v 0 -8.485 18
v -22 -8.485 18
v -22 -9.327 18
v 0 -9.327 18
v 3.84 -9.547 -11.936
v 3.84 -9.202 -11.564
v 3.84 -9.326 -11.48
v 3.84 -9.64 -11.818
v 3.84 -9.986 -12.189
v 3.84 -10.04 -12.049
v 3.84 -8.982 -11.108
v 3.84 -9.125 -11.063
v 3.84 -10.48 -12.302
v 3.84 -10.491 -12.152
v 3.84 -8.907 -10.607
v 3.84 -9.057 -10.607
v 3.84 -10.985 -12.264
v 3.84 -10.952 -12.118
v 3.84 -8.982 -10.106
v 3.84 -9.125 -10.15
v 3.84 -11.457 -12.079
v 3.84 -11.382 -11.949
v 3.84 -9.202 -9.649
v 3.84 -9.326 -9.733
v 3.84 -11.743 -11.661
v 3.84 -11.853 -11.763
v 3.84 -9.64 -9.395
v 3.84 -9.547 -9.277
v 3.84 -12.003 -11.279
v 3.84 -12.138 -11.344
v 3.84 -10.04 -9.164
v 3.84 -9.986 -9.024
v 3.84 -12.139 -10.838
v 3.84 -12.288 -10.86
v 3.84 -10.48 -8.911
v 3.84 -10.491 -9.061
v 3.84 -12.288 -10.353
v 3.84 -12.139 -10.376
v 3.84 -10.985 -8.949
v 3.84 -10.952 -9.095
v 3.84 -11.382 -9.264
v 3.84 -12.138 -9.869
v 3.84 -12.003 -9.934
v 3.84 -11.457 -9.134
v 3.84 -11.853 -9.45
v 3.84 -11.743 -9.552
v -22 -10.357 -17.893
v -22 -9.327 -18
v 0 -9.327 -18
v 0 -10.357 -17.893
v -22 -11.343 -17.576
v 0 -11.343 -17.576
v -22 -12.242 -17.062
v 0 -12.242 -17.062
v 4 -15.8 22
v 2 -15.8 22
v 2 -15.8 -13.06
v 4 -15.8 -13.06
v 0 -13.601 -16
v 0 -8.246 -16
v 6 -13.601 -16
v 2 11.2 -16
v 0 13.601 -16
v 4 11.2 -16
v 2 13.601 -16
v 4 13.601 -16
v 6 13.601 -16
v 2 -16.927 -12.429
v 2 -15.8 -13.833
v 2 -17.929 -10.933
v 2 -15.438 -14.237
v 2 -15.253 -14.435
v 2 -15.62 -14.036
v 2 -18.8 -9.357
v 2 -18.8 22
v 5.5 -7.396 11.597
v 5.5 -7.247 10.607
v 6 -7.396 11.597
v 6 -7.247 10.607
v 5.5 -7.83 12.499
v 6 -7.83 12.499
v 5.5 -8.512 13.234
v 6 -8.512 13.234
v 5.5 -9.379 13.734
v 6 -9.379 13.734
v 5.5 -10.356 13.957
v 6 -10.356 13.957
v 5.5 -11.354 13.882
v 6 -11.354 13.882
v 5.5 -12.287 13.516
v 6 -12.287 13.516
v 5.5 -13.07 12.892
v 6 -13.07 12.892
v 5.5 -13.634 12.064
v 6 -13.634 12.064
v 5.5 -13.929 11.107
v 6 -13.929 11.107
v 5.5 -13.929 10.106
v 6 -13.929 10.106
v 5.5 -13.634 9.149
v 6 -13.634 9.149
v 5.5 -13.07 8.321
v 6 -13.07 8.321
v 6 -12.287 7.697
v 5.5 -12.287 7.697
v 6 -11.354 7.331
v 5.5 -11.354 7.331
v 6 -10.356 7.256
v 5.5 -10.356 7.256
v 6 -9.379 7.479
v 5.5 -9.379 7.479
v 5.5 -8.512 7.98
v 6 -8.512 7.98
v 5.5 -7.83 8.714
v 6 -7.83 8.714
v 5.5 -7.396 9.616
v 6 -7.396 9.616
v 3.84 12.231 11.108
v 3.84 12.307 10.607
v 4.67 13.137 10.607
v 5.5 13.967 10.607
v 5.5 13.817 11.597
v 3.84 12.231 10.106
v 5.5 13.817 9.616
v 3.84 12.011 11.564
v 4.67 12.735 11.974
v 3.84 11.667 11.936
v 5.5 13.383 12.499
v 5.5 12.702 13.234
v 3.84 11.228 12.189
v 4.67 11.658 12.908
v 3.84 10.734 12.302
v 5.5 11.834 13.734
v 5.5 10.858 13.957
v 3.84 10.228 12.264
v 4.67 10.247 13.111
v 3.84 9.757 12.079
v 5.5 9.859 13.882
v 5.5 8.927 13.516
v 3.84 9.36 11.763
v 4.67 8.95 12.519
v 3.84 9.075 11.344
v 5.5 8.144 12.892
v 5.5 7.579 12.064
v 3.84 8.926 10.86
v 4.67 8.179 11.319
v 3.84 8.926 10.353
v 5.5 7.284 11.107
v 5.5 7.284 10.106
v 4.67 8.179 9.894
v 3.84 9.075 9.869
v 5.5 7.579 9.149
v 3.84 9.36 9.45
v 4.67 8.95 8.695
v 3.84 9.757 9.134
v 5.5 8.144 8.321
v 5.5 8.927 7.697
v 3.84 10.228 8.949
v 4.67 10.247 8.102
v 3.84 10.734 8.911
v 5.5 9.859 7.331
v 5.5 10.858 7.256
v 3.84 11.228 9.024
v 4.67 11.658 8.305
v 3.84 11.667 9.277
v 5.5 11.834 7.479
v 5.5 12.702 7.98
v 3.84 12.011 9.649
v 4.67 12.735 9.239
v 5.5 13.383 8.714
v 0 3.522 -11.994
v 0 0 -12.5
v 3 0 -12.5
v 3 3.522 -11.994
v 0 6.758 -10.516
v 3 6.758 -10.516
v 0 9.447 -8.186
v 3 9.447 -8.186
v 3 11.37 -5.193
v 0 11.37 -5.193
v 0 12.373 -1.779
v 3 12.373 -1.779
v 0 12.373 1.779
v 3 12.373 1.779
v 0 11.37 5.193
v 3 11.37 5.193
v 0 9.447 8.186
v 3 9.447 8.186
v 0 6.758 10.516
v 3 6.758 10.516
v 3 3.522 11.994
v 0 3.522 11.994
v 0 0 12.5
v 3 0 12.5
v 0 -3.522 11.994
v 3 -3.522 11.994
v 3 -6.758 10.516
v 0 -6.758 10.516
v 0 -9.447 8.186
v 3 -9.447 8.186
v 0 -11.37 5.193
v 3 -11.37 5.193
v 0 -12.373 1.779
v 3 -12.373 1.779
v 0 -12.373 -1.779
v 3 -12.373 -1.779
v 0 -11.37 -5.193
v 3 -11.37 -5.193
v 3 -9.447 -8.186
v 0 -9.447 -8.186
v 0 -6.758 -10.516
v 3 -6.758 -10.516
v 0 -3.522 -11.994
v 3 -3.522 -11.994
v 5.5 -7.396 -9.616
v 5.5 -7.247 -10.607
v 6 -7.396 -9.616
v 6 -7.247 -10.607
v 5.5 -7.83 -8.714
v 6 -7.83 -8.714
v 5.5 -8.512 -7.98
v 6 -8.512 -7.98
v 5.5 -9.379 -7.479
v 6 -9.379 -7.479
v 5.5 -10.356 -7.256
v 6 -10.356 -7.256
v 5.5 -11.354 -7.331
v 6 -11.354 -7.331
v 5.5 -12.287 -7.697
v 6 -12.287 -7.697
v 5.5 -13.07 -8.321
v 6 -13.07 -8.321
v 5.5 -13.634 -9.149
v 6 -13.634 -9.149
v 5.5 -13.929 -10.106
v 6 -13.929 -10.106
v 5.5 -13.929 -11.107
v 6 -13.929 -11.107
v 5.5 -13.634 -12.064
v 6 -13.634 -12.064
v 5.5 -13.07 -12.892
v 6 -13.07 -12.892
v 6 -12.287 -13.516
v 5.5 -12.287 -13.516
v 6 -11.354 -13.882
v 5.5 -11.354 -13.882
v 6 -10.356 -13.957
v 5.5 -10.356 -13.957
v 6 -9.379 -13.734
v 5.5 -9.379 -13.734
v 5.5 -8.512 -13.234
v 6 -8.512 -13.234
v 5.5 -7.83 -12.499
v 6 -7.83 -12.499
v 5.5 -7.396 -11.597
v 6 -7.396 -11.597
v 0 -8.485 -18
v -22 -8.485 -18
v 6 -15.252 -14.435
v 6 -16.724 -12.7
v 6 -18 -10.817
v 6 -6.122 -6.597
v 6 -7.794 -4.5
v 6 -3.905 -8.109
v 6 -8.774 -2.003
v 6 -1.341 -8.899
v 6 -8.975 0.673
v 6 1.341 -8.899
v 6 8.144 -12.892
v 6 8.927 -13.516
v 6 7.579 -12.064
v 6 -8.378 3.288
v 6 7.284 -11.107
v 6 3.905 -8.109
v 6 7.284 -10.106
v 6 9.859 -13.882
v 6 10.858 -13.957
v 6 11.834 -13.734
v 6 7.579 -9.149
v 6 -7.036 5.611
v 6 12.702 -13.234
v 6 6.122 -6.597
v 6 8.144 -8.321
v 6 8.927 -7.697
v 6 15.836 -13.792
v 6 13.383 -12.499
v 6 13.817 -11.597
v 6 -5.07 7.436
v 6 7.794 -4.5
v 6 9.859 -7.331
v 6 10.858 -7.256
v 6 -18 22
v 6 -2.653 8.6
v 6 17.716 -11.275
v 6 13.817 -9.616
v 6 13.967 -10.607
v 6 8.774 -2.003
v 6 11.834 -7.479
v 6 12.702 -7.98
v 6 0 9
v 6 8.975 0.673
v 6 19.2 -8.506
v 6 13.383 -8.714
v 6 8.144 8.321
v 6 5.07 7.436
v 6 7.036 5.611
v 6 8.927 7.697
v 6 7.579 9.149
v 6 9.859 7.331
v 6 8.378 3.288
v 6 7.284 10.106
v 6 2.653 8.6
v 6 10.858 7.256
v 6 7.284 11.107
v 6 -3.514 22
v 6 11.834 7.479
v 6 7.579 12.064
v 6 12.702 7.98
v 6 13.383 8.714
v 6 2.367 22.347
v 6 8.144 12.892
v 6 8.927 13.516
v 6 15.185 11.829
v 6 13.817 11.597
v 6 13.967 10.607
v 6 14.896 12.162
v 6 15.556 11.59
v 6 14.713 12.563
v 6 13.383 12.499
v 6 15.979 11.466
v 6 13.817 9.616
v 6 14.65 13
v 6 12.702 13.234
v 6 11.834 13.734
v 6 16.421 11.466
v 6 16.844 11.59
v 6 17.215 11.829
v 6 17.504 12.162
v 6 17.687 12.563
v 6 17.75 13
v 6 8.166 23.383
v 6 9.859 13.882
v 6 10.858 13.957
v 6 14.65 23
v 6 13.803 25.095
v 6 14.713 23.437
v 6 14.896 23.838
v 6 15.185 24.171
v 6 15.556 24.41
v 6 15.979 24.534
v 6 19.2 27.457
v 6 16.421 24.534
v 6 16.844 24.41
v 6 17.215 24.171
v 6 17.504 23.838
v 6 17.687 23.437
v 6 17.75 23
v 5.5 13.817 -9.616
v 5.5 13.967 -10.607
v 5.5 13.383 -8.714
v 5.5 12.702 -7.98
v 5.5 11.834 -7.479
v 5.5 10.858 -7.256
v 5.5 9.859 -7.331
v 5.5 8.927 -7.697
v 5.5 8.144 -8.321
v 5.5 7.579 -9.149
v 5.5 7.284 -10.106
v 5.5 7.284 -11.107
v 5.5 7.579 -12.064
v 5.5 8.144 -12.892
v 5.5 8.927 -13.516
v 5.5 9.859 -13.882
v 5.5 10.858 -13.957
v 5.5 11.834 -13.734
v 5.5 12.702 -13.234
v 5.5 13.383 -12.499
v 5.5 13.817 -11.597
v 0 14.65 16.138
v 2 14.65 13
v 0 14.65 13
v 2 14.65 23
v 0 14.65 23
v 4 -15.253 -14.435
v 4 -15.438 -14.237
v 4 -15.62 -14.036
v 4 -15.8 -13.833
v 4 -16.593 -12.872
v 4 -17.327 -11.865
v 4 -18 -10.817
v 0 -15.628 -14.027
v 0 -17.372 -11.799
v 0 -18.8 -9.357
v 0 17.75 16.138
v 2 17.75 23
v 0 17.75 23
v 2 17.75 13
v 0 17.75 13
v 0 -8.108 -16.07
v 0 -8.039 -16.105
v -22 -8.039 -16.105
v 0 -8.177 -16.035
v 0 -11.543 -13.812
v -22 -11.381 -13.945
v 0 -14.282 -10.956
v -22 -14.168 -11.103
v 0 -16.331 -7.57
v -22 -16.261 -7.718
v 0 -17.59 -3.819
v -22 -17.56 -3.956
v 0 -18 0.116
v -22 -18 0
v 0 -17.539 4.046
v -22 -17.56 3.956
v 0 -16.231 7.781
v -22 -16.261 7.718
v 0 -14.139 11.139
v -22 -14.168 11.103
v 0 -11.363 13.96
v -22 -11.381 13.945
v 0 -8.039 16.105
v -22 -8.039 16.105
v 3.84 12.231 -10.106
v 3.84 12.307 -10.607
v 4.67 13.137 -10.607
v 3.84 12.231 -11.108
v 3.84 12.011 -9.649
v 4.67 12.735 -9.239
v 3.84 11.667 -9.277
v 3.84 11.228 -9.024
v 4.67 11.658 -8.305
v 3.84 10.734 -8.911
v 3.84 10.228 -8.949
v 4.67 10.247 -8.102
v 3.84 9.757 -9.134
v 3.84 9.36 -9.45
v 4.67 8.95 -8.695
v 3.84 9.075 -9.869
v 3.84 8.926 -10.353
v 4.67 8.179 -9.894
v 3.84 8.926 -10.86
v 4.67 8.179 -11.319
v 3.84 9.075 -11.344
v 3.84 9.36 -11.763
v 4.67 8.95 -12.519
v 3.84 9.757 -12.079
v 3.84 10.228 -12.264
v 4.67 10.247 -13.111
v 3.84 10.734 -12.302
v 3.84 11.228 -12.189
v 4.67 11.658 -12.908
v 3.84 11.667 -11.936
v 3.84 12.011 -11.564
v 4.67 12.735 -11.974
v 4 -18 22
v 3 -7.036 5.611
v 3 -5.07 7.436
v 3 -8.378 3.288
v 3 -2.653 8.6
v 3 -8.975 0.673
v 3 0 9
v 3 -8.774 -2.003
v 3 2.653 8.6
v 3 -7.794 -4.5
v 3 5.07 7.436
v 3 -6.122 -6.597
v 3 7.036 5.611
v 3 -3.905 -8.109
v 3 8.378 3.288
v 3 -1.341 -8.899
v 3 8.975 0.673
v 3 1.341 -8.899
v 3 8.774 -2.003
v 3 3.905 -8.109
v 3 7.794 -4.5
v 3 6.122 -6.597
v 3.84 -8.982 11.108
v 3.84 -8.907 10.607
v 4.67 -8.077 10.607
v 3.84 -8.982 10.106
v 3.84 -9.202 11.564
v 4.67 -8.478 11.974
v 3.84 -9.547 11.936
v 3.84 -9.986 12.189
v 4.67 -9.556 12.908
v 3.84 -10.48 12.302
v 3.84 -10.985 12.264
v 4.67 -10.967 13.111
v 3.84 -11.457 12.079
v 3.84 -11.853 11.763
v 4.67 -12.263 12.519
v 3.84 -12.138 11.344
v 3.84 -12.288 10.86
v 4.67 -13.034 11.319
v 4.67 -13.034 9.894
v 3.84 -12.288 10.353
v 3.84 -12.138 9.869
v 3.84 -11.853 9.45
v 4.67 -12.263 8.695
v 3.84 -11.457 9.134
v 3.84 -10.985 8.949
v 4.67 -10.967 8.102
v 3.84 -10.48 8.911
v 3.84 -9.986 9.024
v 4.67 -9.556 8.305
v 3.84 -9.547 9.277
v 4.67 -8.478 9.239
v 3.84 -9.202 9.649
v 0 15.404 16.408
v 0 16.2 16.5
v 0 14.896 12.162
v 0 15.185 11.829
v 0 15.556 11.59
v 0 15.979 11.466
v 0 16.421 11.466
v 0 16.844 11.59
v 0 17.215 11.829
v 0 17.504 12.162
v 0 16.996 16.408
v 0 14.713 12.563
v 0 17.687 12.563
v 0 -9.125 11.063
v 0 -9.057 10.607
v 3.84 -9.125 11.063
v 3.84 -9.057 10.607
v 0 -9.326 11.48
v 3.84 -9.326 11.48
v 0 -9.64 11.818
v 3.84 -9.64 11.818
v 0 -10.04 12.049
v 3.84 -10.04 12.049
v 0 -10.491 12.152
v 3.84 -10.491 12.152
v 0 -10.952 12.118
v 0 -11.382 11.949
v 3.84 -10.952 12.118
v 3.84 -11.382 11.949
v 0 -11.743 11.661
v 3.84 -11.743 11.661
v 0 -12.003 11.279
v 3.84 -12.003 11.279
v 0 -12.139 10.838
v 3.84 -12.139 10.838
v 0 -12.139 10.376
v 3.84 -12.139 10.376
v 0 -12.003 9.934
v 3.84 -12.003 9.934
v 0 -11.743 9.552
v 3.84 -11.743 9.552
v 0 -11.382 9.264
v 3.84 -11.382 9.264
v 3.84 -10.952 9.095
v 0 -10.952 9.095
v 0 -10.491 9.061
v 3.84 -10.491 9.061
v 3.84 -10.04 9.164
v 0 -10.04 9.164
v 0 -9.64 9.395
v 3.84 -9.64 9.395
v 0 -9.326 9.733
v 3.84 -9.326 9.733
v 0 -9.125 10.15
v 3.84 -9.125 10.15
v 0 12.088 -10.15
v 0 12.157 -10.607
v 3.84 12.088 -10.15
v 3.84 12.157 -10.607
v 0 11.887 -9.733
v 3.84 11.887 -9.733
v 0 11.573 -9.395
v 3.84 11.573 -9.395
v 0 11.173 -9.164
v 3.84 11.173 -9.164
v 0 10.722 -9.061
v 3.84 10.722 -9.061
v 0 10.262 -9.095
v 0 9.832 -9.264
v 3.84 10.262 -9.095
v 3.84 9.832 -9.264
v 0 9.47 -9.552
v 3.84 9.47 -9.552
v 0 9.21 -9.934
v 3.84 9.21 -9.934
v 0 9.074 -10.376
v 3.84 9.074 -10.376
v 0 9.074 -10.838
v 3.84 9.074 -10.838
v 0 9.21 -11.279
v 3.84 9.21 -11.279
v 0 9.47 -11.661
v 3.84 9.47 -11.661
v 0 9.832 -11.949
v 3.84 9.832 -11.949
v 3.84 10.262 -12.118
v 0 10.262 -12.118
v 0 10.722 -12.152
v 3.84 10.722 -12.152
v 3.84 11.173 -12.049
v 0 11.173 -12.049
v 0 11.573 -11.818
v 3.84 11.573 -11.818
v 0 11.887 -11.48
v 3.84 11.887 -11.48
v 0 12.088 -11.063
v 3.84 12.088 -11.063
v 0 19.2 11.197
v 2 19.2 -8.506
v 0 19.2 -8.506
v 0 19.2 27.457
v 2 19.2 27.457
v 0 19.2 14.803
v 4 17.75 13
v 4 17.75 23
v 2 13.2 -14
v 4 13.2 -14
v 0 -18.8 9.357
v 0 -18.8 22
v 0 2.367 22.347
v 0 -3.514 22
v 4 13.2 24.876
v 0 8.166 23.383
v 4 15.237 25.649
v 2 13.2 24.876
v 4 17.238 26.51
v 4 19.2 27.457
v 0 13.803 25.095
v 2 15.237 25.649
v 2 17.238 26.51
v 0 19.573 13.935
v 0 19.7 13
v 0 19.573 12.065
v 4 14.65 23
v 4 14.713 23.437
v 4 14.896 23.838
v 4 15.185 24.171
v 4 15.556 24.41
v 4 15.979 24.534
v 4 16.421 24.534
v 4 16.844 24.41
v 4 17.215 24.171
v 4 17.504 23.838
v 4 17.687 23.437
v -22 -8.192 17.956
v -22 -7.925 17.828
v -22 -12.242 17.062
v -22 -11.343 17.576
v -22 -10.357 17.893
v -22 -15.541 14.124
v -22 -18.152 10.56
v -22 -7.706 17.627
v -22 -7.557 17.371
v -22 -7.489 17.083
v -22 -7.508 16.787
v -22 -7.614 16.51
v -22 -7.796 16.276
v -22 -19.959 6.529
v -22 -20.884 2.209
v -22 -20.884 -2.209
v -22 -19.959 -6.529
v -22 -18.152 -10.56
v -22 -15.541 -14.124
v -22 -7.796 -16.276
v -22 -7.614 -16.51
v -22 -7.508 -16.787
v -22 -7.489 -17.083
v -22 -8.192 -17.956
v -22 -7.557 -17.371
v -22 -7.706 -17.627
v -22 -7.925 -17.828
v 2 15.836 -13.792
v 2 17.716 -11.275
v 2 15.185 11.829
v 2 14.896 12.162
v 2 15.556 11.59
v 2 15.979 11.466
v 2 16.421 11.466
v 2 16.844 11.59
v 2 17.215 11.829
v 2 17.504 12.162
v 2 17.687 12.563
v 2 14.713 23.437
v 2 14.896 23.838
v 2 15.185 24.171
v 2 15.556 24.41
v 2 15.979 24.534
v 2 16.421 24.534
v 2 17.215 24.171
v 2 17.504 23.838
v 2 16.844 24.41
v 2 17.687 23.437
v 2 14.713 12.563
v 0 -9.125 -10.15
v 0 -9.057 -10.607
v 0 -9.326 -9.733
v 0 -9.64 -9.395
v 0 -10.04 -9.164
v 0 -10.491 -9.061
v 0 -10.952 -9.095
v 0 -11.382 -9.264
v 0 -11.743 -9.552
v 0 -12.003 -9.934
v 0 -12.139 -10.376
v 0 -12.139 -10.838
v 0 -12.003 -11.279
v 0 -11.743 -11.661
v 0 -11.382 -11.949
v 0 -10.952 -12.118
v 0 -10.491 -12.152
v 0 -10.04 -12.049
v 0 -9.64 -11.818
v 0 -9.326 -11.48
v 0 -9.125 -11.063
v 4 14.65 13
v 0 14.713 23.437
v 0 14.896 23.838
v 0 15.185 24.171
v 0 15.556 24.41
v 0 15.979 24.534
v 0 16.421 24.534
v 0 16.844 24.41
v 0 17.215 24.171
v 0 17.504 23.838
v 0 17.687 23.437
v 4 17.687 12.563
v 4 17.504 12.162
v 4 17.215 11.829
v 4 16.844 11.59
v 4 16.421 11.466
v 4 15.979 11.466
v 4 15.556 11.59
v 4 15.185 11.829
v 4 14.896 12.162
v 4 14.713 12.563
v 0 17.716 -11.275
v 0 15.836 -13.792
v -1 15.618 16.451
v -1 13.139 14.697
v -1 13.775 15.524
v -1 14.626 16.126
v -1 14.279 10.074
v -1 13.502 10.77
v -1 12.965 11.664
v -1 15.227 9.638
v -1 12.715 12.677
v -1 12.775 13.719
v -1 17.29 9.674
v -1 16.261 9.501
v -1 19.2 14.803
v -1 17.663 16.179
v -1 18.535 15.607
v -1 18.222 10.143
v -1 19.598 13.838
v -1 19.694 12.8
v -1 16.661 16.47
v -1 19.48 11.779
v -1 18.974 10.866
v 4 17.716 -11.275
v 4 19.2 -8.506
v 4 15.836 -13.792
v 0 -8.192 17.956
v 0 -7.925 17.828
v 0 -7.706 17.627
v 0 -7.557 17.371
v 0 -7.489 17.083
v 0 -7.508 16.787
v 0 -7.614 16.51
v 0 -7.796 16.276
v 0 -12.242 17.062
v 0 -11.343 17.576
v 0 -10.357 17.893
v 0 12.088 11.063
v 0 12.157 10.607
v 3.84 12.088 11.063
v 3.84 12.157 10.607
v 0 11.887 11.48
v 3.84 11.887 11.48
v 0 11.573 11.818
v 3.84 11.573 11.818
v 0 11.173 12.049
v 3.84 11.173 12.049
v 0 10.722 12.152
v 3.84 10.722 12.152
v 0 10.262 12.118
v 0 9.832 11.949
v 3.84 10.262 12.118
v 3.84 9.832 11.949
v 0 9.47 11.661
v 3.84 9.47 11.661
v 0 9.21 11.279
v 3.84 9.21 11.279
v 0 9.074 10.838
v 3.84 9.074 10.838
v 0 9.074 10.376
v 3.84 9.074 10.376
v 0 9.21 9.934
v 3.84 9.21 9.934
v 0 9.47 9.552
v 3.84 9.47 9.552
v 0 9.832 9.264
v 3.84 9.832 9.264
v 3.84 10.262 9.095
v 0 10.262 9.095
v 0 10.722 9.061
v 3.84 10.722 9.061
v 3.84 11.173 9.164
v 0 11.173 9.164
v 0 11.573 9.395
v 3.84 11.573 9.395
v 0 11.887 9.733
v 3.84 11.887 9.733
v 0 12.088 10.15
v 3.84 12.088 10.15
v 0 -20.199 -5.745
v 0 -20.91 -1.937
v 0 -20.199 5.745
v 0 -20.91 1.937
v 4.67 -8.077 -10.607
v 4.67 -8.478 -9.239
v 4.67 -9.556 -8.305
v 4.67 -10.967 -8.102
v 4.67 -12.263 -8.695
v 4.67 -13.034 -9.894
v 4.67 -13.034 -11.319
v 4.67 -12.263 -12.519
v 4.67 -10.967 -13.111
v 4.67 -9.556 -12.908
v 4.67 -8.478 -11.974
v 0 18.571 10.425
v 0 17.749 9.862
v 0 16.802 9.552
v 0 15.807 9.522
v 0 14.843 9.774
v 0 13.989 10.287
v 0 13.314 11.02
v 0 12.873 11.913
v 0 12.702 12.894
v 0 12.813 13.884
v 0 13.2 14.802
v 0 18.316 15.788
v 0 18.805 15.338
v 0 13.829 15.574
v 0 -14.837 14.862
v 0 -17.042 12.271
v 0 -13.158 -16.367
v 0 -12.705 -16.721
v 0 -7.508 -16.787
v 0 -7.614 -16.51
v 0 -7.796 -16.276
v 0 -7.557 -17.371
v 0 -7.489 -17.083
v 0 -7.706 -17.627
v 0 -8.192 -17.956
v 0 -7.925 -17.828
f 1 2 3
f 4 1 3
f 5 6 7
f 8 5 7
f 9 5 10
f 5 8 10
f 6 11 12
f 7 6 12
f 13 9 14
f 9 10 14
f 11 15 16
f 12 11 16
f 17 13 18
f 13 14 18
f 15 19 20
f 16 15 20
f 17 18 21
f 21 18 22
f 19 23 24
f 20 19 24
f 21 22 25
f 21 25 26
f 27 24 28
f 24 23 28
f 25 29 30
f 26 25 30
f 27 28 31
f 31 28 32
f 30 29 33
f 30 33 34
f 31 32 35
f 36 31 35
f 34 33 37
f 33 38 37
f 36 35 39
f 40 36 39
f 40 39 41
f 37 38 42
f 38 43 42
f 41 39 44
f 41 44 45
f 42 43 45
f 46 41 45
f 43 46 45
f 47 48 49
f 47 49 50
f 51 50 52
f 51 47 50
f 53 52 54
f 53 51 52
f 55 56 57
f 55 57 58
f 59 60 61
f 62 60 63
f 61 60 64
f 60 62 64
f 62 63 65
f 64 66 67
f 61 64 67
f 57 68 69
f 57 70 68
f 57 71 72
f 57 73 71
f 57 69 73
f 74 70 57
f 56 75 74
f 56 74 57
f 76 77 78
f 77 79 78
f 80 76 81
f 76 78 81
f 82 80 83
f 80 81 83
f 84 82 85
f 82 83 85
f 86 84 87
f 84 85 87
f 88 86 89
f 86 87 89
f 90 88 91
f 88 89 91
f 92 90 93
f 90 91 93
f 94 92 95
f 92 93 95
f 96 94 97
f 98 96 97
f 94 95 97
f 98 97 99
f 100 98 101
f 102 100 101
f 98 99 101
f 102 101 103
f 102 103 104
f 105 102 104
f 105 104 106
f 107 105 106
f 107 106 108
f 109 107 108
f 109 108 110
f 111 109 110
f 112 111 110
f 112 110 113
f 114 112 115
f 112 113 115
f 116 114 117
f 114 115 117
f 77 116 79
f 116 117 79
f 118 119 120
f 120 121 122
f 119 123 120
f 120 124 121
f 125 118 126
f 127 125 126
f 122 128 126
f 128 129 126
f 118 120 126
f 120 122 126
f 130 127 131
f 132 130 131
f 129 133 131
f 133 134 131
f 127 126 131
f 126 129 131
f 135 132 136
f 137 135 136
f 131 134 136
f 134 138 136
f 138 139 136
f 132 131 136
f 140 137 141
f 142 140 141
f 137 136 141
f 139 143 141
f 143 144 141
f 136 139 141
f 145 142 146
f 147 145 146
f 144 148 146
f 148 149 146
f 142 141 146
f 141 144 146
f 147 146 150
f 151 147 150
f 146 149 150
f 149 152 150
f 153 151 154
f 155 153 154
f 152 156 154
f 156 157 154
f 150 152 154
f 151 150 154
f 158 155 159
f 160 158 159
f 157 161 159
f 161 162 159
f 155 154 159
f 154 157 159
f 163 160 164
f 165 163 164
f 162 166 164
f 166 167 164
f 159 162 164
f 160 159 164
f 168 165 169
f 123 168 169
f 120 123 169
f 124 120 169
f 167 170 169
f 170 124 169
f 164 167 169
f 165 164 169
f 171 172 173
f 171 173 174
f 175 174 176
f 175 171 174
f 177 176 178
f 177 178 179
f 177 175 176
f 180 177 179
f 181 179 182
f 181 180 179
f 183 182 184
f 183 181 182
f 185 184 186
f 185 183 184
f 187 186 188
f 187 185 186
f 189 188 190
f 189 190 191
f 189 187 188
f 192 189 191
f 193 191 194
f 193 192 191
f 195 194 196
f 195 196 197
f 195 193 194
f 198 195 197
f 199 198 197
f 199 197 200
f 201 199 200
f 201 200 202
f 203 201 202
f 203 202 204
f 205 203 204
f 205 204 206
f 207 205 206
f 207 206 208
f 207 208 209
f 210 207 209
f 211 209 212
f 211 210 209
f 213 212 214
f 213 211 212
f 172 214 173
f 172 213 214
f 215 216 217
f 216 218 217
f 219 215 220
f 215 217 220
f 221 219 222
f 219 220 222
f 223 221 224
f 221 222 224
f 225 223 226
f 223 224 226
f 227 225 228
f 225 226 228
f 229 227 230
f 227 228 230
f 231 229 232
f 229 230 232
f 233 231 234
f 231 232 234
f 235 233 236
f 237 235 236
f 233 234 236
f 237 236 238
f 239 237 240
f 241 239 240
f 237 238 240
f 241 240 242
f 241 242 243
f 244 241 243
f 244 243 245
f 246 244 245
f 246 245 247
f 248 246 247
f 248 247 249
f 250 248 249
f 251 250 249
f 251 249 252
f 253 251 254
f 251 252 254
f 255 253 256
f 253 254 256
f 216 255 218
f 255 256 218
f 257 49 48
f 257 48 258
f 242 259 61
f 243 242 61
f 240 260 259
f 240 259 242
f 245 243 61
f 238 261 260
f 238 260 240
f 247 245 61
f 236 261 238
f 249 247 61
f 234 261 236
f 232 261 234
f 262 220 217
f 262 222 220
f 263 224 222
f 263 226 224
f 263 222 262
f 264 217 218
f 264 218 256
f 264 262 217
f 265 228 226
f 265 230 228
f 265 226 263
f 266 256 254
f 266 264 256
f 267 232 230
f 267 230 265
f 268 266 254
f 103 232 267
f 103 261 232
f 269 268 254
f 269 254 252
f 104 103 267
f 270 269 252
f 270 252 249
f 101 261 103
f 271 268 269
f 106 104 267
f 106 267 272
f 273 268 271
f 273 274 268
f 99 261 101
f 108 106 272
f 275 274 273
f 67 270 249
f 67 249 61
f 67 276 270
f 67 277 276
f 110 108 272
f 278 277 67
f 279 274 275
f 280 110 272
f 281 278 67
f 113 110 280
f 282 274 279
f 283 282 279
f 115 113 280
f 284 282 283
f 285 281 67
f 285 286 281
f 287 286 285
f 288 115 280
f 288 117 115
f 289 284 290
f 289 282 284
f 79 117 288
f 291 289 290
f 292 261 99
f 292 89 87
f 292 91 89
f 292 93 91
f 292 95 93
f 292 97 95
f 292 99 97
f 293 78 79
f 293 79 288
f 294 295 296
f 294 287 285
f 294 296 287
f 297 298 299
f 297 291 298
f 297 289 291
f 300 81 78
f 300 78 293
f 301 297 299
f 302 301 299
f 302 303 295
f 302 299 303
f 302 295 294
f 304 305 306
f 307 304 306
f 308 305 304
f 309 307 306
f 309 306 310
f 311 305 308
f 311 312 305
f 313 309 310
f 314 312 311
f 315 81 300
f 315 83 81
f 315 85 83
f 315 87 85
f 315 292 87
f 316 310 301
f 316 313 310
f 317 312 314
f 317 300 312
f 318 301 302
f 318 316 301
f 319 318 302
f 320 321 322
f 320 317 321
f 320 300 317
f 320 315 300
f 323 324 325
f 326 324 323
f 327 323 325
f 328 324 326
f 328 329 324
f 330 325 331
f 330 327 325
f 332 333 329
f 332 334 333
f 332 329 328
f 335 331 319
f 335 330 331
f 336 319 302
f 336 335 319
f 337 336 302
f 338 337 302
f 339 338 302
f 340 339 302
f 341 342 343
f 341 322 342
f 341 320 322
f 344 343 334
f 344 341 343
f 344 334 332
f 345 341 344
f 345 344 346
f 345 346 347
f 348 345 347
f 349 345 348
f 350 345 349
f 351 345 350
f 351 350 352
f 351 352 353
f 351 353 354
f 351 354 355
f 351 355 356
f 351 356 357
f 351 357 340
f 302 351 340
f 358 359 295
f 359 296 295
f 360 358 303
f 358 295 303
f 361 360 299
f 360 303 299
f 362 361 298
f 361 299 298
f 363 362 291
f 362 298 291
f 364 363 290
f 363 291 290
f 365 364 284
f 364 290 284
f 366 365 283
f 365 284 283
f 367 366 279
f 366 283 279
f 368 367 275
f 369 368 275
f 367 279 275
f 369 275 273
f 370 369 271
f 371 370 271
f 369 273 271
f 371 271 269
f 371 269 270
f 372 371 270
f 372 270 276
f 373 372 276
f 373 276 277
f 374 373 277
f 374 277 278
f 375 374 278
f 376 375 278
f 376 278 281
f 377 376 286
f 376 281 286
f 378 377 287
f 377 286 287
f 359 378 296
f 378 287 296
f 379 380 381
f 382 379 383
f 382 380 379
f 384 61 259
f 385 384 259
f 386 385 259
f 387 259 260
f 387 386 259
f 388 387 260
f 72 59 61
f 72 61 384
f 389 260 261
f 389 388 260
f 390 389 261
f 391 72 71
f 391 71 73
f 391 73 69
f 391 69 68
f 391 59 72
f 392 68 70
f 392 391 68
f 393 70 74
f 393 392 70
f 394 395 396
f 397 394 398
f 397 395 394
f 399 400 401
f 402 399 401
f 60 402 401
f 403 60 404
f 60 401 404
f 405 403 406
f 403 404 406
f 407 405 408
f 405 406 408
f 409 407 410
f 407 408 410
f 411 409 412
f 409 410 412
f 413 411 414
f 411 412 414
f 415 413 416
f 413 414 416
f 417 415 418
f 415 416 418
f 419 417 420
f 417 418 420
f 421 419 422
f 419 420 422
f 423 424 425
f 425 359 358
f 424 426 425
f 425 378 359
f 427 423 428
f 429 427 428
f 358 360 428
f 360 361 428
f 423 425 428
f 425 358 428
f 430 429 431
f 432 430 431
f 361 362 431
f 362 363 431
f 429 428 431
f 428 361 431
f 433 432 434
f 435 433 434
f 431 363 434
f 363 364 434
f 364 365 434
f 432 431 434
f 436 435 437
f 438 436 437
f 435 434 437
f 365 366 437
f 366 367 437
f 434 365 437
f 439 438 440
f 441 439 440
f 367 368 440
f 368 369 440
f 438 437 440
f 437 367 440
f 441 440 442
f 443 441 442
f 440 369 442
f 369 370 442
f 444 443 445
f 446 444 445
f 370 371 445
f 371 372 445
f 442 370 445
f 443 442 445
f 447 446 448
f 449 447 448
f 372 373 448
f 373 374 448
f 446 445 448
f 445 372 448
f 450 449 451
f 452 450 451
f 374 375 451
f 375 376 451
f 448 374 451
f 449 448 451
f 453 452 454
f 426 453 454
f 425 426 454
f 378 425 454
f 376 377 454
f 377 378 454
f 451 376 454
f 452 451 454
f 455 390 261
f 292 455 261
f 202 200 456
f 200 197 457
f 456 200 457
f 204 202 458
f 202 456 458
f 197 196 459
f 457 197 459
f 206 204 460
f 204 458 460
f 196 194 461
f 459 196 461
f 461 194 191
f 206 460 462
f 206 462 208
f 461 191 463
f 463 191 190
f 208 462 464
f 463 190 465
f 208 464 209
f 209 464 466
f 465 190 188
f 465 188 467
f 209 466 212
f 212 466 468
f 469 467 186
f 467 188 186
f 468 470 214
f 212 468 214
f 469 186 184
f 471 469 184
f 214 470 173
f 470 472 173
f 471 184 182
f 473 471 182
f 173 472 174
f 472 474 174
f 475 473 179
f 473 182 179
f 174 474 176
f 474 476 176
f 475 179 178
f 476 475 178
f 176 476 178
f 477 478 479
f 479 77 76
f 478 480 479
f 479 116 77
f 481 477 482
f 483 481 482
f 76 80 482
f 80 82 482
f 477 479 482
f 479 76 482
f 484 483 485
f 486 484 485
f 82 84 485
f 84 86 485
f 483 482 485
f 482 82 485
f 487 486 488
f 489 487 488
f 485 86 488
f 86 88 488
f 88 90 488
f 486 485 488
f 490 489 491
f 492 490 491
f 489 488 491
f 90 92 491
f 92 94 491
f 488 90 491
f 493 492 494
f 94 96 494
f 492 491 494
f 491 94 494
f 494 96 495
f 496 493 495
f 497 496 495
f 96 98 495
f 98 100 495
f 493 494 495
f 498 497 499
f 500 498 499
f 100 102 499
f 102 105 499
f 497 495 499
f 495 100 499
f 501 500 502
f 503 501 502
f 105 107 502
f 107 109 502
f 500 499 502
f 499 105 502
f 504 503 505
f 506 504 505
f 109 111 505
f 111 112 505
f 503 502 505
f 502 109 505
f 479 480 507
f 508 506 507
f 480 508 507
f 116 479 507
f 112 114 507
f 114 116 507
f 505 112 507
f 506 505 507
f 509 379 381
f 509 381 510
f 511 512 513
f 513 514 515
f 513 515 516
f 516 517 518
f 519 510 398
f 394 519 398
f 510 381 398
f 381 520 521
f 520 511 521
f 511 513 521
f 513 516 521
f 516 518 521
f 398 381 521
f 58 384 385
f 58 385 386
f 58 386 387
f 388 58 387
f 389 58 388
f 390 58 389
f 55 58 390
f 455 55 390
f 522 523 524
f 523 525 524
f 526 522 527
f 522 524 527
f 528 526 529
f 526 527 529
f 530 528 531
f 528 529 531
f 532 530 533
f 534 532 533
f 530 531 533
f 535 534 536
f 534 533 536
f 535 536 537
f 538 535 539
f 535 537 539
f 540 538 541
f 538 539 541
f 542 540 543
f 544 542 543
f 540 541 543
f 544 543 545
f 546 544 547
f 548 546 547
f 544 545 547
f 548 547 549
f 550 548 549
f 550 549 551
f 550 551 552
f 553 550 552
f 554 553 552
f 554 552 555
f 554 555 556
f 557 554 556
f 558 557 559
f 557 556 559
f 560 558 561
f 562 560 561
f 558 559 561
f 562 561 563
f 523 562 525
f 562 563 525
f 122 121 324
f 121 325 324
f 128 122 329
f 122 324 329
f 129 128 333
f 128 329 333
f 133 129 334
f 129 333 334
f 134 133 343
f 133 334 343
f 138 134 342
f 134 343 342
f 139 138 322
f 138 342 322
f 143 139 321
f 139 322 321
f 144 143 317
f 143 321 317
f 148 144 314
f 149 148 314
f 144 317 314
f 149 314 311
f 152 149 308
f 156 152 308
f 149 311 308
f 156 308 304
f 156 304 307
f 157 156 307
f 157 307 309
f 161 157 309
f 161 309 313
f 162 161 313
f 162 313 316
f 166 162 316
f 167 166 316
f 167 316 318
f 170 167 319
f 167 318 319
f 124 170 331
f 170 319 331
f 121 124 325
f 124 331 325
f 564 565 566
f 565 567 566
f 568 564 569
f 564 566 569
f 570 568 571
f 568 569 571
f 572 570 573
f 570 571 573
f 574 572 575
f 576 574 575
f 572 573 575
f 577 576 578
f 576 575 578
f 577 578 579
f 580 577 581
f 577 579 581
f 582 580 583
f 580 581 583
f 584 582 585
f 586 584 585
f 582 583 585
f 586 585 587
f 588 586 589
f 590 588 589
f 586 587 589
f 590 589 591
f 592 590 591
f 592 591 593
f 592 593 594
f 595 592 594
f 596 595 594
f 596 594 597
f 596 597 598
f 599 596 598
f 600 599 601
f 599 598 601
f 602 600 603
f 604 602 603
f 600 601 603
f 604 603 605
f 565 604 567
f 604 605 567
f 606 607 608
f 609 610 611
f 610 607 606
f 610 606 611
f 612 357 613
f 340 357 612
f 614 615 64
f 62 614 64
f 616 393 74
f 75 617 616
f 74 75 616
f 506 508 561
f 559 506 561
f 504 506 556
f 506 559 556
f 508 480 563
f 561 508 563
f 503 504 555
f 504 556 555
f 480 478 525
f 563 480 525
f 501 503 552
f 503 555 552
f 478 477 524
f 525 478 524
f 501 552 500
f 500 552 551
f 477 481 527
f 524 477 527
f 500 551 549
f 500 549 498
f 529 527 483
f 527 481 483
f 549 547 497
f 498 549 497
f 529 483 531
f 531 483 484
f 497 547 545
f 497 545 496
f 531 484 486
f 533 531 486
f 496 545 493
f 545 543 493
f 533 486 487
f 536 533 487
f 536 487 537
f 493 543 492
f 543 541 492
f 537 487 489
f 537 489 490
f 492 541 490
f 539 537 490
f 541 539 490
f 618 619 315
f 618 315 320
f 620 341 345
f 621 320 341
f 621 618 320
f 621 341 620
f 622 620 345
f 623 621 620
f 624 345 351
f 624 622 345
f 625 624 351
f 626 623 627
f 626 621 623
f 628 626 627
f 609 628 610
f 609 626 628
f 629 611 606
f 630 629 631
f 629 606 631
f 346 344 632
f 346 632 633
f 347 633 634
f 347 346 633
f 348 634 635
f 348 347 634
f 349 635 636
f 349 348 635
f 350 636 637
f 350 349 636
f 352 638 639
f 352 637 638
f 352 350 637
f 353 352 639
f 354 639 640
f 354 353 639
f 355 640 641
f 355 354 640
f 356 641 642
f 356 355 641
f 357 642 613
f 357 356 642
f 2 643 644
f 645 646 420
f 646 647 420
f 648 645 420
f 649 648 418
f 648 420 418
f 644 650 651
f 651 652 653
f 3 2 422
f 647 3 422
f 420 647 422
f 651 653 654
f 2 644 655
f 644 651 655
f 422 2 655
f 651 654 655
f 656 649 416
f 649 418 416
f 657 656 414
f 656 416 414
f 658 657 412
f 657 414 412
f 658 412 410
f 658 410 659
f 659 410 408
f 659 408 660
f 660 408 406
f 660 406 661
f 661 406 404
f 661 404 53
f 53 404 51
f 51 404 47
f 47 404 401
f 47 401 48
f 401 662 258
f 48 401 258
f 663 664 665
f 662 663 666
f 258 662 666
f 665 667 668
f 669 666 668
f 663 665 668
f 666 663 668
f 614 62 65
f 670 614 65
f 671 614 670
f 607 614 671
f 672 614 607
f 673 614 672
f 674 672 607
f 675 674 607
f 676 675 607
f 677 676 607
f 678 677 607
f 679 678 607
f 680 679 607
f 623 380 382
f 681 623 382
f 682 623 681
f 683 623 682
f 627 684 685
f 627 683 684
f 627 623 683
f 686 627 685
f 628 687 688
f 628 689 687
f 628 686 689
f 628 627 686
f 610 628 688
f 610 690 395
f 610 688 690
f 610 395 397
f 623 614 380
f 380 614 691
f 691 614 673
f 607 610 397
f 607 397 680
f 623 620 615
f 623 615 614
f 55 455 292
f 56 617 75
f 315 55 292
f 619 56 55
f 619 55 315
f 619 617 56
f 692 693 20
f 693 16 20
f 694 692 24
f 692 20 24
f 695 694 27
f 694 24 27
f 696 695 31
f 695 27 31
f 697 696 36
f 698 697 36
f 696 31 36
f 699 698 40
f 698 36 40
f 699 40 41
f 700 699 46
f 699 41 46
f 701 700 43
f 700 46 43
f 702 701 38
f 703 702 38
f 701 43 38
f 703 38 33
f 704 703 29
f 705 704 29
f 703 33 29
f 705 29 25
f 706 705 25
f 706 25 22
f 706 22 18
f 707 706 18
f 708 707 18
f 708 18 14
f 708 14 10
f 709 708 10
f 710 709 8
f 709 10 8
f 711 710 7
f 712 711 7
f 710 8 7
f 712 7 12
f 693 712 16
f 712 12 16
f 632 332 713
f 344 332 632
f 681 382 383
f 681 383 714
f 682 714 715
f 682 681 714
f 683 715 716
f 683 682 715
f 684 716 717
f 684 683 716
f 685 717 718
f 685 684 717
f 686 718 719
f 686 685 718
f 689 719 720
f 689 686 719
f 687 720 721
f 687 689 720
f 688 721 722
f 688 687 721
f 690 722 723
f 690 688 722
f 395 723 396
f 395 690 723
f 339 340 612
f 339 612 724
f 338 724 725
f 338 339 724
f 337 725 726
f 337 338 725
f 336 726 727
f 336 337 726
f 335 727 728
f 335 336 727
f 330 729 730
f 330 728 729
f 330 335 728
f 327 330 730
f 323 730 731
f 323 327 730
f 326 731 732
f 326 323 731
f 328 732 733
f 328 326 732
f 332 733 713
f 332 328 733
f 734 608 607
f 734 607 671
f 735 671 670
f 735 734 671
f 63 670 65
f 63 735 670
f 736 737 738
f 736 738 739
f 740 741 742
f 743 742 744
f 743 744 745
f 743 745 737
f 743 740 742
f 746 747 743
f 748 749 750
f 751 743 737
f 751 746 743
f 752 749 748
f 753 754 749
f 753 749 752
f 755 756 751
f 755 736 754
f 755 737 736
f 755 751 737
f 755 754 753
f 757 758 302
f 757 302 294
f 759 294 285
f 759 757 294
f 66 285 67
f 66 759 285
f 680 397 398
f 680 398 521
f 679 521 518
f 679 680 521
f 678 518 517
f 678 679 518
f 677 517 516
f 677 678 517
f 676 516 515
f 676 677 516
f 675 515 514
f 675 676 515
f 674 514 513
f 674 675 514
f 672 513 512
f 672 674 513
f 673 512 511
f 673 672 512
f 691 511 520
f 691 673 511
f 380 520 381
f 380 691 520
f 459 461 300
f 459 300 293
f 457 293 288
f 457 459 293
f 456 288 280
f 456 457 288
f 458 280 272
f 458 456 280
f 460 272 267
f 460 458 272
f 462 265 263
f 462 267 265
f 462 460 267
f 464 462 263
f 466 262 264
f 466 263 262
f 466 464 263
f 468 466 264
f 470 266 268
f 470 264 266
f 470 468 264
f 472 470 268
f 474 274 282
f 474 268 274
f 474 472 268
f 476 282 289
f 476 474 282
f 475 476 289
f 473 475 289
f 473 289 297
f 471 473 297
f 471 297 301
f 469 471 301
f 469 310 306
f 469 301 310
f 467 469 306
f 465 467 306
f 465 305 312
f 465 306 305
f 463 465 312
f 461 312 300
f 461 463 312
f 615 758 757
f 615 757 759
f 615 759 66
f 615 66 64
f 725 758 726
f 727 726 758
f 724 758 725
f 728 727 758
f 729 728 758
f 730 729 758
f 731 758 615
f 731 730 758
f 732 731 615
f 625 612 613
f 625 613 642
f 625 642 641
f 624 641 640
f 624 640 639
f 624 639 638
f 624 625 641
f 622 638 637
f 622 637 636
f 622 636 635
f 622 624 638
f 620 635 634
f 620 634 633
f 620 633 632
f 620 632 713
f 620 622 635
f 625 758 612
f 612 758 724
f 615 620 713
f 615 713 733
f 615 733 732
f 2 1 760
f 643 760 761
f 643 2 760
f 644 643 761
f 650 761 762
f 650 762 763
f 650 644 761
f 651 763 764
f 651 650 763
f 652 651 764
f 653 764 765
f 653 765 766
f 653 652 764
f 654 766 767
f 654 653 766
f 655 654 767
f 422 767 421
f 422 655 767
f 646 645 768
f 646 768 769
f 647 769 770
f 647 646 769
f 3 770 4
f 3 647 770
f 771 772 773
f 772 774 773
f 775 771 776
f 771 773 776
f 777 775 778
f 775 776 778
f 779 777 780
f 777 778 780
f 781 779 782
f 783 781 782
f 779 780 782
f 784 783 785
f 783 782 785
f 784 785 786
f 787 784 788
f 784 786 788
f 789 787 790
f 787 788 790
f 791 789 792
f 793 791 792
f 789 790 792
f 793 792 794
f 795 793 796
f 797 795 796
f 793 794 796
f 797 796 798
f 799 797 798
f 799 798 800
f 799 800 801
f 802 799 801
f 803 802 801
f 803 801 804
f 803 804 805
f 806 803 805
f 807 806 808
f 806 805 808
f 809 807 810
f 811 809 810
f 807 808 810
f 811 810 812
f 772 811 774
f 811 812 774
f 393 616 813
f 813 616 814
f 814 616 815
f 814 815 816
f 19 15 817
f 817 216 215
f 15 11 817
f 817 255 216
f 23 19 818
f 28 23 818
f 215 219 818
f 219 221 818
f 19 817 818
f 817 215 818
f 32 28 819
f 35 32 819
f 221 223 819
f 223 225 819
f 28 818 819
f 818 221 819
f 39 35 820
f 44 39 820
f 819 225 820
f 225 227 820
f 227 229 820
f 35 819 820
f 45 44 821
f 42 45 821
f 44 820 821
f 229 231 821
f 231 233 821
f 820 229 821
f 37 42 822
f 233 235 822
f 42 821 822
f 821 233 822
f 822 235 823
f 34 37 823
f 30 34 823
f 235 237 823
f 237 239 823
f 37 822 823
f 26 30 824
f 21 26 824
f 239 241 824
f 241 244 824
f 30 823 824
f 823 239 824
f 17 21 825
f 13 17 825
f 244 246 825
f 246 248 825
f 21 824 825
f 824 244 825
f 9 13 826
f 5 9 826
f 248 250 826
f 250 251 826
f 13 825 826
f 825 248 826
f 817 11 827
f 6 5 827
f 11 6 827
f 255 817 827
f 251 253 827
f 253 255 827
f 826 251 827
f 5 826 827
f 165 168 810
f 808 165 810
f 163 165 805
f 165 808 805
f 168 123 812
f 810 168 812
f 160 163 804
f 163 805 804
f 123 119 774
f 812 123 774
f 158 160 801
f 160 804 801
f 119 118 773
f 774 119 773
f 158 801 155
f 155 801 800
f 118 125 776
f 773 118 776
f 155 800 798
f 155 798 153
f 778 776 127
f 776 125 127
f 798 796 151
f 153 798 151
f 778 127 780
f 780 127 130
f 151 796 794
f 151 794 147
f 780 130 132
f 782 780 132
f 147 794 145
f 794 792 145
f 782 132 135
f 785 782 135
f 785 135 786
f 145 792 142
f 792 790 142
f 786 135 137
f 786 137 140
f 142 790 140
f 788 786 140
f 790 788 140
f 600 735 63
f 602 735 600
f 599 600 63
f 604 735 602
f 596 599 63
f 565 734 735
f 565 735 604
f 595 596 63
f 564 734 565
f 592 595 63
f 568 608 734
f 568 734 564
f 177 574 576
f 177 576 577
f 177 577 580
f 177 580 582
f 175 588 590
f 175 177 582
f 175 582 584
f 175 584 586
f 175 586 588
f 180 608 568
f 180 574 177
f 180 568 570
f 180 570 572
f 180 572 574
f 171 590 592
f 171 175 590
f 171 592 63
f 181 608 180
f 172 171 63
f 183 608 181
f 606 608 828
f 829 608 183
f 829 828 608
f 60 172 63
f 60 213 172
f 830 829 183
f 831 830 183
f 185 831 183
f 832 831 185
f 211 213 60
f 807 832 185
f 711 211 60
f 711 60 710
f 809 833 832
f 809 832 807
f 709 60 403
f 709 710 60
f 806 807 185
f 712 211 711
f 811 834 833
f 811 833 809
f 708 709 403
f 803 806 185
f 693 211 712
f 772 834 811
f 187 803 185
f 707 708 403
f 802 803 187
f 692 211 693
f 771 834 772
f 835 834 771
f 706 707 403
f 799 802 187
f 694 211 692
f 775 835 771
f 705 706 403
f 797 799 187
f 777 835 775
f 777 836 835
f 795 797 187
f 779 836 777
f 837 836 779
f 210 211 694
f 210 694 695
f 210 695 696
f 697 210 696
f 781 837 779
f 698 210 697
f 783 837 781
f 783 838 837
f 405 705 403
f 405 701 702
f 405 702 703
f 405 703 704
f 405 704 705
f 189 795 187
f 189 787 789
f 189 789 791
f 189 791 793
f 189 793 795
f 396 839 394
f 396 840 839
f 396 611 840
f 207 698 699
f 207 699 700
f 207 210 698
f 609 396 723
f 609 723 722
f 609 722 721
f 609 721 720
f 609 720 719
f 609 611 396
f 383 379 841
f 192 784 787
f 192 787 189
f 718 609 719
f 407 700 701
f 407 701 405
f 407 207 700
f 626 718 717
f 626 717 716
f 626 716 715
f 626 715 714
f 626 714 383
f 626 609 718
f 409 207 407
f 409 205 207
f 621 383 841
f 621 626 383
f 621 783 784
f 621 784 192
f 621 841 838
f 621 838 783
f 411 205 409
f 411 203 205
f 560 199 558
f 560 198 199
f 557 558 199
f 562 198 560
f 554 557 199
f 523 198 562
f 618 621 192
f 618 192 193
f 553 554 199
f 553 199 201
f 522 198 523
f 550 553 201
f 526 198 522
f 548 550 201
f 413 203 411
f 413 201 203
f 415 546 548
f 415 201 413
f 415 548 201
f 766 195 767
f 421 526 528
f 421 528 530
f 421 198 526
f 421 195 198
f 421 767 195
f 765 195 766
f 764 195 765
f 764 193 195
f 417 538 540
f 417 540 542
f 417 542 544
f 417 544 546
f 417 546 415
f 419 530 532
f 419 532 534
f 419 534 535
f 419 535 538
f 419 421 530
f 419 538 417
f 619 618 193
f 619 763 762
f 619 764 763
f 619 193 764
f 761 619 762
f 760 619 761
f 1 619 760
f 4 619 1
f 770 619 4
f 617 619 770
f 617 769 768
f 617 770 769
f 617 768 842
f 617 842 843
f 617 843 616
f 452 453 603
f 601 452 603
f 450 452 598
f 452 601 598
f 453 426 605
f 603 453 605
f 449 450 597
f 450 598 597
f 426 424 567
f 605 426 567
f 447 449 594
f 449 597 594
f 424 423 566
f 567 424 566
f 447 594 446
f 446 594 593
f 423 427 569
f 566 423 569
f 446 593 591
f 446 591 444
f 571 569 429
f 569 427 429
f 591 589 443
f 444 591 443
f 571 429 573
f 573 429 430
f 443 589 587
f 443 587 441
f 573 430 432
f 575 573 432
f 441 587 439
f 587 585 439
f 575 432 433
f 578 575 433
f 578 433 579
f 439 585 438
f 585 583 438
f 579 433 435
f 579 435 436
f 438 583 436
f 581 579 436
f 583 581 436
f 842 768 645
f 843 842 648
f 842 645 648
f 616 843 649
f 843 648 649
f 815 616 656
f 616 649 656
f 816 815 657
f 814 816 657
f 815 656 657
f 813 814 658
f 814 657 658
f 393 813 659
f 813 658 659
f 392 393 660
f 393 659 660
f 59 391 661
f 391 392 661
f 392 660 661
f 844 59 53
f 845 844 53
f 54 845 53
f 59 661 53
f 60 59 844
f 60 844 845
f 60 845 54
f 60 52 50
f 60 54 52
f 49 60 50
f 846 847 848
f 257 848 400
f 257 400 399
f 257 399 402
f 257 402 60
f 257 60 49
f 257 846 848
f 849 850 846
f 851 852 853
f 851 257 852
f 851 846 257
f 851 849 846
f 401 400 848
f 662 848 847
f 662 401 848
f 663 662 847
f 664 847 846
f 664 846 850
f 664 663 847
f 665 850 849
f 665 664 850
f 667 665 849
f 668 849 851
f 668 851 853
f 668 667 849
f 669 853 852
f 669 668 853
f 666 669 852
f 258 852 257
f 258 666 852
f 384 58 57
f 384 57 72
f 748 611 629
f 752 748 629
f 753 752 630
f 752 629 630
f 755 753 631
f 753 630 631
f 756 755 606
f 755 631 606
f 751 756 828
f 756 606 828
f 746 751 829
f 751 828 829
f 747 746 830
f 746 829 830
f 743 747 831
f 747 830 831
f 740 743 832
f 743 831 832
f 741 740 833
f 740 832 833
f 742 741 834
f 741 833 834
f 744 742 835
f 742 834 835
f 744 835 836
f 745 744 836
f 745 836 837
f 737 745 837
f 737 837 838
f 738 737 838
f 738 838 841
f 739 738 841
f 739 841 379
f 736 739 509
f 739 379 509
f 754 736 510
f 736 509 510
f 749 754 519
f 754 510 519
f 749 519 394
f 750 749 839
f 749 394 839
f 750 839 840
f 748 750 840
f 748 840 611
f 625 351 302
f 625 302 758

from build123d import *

# Parameters (mm, degrees)
DODANIE_WYCI_GNI_CIE1_START = 27.457167
DODANIE_WYCI_GNI_CIE1_DEPTH = 43.457167
SZKIC2_OUTSIDE_W            = 57.065
SZKIC2_OUTSIDE_H            = 51.608
WYTNIJ_WYCI_GNI_CIE1_DEPTH  = 35.037273975
SZKIC2_4_R                  = 12.5
SZKIC2_4_R_2                = 9
WYTNIJ_WYCI_GNI_CIE2_DEPTH  = 3
SZKIC2_5_R                  = 9
WYTNIJ_WYCI_GNI_CIE3_DEPTH  = 35.037274287
SFAZOWANIE1_SIZE            = 2
DODANIE_WYCI_GNI_CIE2_START = 22
DODANIE_WYCI_GNI_CIE2_DEPTH = 22
ZAOKR_GLENIE1_START         = -22
ZAOKR_GLENIE1_DEPTH         = 22
WYTNIJ_WYCI_GNI_CIE4_DEPTH  = 45.484784375
SZKIC8_R                    = 3.5
DODANIE_WYCI_GNI_CIE3_DEPTH = 1


with BuildPart() as part:
    # Szkic1 → Dodanie-wyciągnięcie1 (new body)
    with BuildSketch(Plane.XY.offset(DODANIE_WYCI_GNI_CIE1_START)):
        Polygon((4, 13.2), (2, 13.2), (2, 19.2), (0, 19.2), (0, -18.8), (2, -18.8), (2, -15.8), (4, -15.8), (4, -18), (6, -18), (6, 19.2), (4, 19.2), align=None)
    extrude(amount=-DODANIE_WYCI_GNI_CIE1_DEPTH)

    # Szkic2 outside → Wytnij-wyciągnięcie1 (cut, through all)
    with BuildSketch(Plane(origin=(0, 0, 0), x_dir=(0, 0, -1), z_dir=(1, 0, 0))):
        with Locations((-5.7285, 0.2)):
            Rectangle(SZKIC2_OUTSIDE_W, SZKIC2_OUTSIDE_H)
        with BuildLine():
            Line((-22, -18.8), (-22, -3.514226))
            ThreePointArc((-22, -3.514226), (-23.38343065, 8.166064436), (-27.457167387, 19.2))
            Line((-27.457167387, 19.2), (8.506468127, 19.2))
            ThreePointArc((8.506468127, 19.2), (12.568915153, 16.823268763), (16, 13.601470509))
            Line((16, 13.601470509), (16, -13.601470509))
            ThreePointArc((16, -13.601470509), (12.942371407, -16.537684915), (9.357350052, -18.8))
            Line((9.357350052, -18.8), (-22, -18.8))
        make_face(mode=Mode.SUBTRACT)
    extrude(amount=WYTNIJ_WYCI_GNI_CIE1_DEPTH, mode=Mode.SUBTRACT)

    # Szkic2<4> → Wytnij-wyciągnięcie2 (cut)
    with BuildSketch(Plane(origin=(0, 0, 0), x_dir=(0, 0, -1), z_dir=(1, 0, 0))):
        Circle(SZKIC2_4_R)
        Circle(SZKIC2_4_R_2, mode=Mode.SUBTRACT)
    extrude(amount=WYTNIJ_WYCI_GNI_CIE2_DEPTH, mode=Mode.SUBTRACT)

    # Szkic2<5> → Wytnij-wyciągnięcie3 (cut, through all)
    with BuildSketch(Plane(origin=(0, 0, 0), x_dir=(0, 0, -1), z_dir=(1, 0, 0))):
        with Locations(Location((0, 0, 0), (0, 0, 180))):
            Circle(SZKIC2_5_R)
    extrude(amount=WYTNIJ_WYCI_GNI_CIE3_DEPTH, mode=Mode.SUBTRACT)

    # Sfazowanie1
    # the kernel refuses this chamfer: 2 mm, written as the material it takes off along each edge
    with BuildSketch(Plane(origin=(4, 13.2, -16), x_dir=(0, 0, 1), z_dir=(-1, 0, 0))) as sfazowanie1_piece_1:
        Polygon((SFAZOWANIE1_SIZE, 0), (0, -SFAZOWANIE1_SIZE), (0, 0), align=None)
    extrude(amount=2, mode=Mode.SUBTRACT)
    with BuildSketch(Plane(origin=(4, -15.8, -13.833293173), x_dir=(0, 0, 1), z_dir=(-1, 0, 0))) as sfazowanie1_piece_2:
        with BuildLine():
            Line((0.773430999, 0), (-0.601291335, 0.547368421))
            ThreePointArc((-0.601291335, 0.547368421), (-0.33094721, 0.295991022), (0, 0))
            Line((0, 0), (0.773430999, 0))
        make_face()
    extrude(amount=2, mode=Mode.SUBTRACT)

    # Szkic3 → Dodanie-wyciągnięcie2 (add)
    with BuildSketch(Plane.ZY.offset(DODANIE_WYCI_GNI_CIE2_START)):
        with BuildLine():
            Line((-18, -10.816653826), (-18, 0))
            ThreePointArc((-18, 0), (0, -18), (18, 0))
            Line((18, 0), (18, -10.816653826))
            ThreePointArc((18, -10.816653826), (0, -21), (-18, -10.816653826))
        make_face()
    extrude(amount=-DODANIE_WYCI_GNI_CIE2_DEPTH)

    # Zaokrąglenie1: read off the stored shape, not the designer's step
    # Zaokrąglenie1 outline → Zaokrąglenie1 (cut)
    with BuildSketch(Plane.YZ.offset(ZAOKR_GLENIE1_START)):
        with BuildLine():
            Line((-10.816653826, -18), (-9.327379053, -18))
            ThreePointArc((-9.327379053, -18), (-10.858310142, -17.759858191), (-12.242185007, -17.0625))
            ThreePointArc((-12.242185007, -17.0625), (-11.538944434, -17.545733423), (-10.816653826, -18))
        make_face()
        with BuildLine():
            ThreePointArc((-8.038687618, -16.105263158), (-7.511952847, -17.229415734), (-8.485281374, -18))
            Line((-8.485281374, -18), (0, -18))
            ThreePointArc((0, -18), (-4.12948321, -17.519913482), (-8.038687618, -16.105263158))
        make_face()
        with BuildLine():
            ThreePointArc((-10.816653826, 18), (-11.538944434, 17.545733423), (-12.242185007, 17.0625))
            ThreePointArc((-12.242185007, 17.0625), (-10.858310142, 17.759858191), (-9.327379053, 18))
            Line((-9.327379053, 18), (-10.816653826, 18))
        make_face()
        with BuildLine():
            ThreePointArc((-8.485281374, 18), (-7.511952847, 17.229415734), (-8.038687618, 16.105263158))
            ThreePointArc((-8.038687618, 16.105263158), (-4.12948321, 17.519913482), (0, 18))
            Line((0, 18), (-8.485281374, 18))
        make_face()
    extrude(amount=ZAOKR_GLENIE1_DEPTH, mode=Mode.SUBTRACT)

    # ZaawansowanyOtwór1: read off the stored shape, not the designer's step
    # ZaawansowanyOtwór1 outline → ZaawansowanyOtwór1 (revolve, cut)
    with BuildSketch(Plane(origin=(0, -10.606601718, 10.606601718), x_dir=(0, 1, 0), z_dir=(0, 0, -1))):
        Polygon((1.7, 3.84), (3.36, 5.5), (3.36, 6), (0, 6), (0, 0), (1.55, 0), (1.55, 3.84), align=None)
    revolve(axis=Axis((0, -10.606601718, 10.606601718), (1, 0, 0)), mode=Mode.SUBTRACT)

    # ZaawansowanyOtw_r1 2 outline → ZaawansowanyOtw_r1 2 (revolve, cut)
    with BuildSketch(Plane(origin=(0, -10.606601718, -10.606601718), x_dir=(0, 1, 0), z_dir=(0, 0, -1))):
        Polygon((3.36, 6), (0, 6), (0, 0), (1.55, 0), (1.55, 3.84), (1.7, 3.84), (3.36, 5.5), align=None)
    revolve(axis=Axis((0, -10.606601718, -10.606601718), (1, 0, 0)), mode=Mode.SUBTRACT)

    # ZaawansowanyOtw_r1 3 outline → ZaawansowanyOtw_r1 3 (revolve, cut)
    with BuildSketch(Plane(origin=(0, 10.606601718, -10.606601718), x_dir=(0, 1, 0), z_dir=(0, 0, -1))):
        Polygon((3.36, 6), (0, 6), (0, 0), (1.55, 0), (1.55, 3.84), (1.7, 3.84), (3.36, 5.5), align=None)
    revolve(axis=Axis((0, 10.606601718, -10.606601718), (1, 0, 0)), mode=Mode.SUBTRACT)

    # ZaawansowanyOtw_r1 4 outline → ZaawansowanyOtw_r1 4 (revolve, cut)
    with BuildSketch(Plane(origin=(0, 10.606601718, 10.606601718), x_dir=(0, 1, 0), z_dir=(0, 0, -1))):
        Polygon((3.36, 6), (0, 6), (0, 0), (1.55, 0), (1.55, 3.84), (1.7, 3.84), (3.36, 5.5), align=None)
    revolve(axis=Axis((0, 10.606601718, 10.606601718), (1, 0, 0)), mode=Mode.SUBTRACT)

    # Szkic7 → Wytnij-wyciągnięcie4 (cut, through all)
    with BuildSketch(Plane(origin=(6, 0, 0), x_dir=(0, 0, -1), z_dir=(1, 0, 0))):
        with BuildLine():
            Line((-23, 17.75), (-13, 17.75))
            ThreePointArc((-13, 17.75), (-11.45, 16.2), (-13, 14.65))
            Line((-13, 14.65), (-23, 14.65))
            ThreePointArc((-23, 14.65), (-24.55, 16.2), (-23, 17.75))
        make_face()
    extrude(amount=-WYTNIJ_WYCI_GNI_CIE4_DEPTH, mode=Mode.SUBTRACT)

    # Szkic8 → Dodanie-wyciągnięcie3 (add)
    with BuildSketch(Plane.ZY):
        with Locations(Location((13, 16.2, 0), (0, 0, 58.997280866))):
            Circle(SZKIC8_R)
    extrude(amount=DODANIE_WYCI_GNI_CIE3_DEPTH)


solid = part.part
